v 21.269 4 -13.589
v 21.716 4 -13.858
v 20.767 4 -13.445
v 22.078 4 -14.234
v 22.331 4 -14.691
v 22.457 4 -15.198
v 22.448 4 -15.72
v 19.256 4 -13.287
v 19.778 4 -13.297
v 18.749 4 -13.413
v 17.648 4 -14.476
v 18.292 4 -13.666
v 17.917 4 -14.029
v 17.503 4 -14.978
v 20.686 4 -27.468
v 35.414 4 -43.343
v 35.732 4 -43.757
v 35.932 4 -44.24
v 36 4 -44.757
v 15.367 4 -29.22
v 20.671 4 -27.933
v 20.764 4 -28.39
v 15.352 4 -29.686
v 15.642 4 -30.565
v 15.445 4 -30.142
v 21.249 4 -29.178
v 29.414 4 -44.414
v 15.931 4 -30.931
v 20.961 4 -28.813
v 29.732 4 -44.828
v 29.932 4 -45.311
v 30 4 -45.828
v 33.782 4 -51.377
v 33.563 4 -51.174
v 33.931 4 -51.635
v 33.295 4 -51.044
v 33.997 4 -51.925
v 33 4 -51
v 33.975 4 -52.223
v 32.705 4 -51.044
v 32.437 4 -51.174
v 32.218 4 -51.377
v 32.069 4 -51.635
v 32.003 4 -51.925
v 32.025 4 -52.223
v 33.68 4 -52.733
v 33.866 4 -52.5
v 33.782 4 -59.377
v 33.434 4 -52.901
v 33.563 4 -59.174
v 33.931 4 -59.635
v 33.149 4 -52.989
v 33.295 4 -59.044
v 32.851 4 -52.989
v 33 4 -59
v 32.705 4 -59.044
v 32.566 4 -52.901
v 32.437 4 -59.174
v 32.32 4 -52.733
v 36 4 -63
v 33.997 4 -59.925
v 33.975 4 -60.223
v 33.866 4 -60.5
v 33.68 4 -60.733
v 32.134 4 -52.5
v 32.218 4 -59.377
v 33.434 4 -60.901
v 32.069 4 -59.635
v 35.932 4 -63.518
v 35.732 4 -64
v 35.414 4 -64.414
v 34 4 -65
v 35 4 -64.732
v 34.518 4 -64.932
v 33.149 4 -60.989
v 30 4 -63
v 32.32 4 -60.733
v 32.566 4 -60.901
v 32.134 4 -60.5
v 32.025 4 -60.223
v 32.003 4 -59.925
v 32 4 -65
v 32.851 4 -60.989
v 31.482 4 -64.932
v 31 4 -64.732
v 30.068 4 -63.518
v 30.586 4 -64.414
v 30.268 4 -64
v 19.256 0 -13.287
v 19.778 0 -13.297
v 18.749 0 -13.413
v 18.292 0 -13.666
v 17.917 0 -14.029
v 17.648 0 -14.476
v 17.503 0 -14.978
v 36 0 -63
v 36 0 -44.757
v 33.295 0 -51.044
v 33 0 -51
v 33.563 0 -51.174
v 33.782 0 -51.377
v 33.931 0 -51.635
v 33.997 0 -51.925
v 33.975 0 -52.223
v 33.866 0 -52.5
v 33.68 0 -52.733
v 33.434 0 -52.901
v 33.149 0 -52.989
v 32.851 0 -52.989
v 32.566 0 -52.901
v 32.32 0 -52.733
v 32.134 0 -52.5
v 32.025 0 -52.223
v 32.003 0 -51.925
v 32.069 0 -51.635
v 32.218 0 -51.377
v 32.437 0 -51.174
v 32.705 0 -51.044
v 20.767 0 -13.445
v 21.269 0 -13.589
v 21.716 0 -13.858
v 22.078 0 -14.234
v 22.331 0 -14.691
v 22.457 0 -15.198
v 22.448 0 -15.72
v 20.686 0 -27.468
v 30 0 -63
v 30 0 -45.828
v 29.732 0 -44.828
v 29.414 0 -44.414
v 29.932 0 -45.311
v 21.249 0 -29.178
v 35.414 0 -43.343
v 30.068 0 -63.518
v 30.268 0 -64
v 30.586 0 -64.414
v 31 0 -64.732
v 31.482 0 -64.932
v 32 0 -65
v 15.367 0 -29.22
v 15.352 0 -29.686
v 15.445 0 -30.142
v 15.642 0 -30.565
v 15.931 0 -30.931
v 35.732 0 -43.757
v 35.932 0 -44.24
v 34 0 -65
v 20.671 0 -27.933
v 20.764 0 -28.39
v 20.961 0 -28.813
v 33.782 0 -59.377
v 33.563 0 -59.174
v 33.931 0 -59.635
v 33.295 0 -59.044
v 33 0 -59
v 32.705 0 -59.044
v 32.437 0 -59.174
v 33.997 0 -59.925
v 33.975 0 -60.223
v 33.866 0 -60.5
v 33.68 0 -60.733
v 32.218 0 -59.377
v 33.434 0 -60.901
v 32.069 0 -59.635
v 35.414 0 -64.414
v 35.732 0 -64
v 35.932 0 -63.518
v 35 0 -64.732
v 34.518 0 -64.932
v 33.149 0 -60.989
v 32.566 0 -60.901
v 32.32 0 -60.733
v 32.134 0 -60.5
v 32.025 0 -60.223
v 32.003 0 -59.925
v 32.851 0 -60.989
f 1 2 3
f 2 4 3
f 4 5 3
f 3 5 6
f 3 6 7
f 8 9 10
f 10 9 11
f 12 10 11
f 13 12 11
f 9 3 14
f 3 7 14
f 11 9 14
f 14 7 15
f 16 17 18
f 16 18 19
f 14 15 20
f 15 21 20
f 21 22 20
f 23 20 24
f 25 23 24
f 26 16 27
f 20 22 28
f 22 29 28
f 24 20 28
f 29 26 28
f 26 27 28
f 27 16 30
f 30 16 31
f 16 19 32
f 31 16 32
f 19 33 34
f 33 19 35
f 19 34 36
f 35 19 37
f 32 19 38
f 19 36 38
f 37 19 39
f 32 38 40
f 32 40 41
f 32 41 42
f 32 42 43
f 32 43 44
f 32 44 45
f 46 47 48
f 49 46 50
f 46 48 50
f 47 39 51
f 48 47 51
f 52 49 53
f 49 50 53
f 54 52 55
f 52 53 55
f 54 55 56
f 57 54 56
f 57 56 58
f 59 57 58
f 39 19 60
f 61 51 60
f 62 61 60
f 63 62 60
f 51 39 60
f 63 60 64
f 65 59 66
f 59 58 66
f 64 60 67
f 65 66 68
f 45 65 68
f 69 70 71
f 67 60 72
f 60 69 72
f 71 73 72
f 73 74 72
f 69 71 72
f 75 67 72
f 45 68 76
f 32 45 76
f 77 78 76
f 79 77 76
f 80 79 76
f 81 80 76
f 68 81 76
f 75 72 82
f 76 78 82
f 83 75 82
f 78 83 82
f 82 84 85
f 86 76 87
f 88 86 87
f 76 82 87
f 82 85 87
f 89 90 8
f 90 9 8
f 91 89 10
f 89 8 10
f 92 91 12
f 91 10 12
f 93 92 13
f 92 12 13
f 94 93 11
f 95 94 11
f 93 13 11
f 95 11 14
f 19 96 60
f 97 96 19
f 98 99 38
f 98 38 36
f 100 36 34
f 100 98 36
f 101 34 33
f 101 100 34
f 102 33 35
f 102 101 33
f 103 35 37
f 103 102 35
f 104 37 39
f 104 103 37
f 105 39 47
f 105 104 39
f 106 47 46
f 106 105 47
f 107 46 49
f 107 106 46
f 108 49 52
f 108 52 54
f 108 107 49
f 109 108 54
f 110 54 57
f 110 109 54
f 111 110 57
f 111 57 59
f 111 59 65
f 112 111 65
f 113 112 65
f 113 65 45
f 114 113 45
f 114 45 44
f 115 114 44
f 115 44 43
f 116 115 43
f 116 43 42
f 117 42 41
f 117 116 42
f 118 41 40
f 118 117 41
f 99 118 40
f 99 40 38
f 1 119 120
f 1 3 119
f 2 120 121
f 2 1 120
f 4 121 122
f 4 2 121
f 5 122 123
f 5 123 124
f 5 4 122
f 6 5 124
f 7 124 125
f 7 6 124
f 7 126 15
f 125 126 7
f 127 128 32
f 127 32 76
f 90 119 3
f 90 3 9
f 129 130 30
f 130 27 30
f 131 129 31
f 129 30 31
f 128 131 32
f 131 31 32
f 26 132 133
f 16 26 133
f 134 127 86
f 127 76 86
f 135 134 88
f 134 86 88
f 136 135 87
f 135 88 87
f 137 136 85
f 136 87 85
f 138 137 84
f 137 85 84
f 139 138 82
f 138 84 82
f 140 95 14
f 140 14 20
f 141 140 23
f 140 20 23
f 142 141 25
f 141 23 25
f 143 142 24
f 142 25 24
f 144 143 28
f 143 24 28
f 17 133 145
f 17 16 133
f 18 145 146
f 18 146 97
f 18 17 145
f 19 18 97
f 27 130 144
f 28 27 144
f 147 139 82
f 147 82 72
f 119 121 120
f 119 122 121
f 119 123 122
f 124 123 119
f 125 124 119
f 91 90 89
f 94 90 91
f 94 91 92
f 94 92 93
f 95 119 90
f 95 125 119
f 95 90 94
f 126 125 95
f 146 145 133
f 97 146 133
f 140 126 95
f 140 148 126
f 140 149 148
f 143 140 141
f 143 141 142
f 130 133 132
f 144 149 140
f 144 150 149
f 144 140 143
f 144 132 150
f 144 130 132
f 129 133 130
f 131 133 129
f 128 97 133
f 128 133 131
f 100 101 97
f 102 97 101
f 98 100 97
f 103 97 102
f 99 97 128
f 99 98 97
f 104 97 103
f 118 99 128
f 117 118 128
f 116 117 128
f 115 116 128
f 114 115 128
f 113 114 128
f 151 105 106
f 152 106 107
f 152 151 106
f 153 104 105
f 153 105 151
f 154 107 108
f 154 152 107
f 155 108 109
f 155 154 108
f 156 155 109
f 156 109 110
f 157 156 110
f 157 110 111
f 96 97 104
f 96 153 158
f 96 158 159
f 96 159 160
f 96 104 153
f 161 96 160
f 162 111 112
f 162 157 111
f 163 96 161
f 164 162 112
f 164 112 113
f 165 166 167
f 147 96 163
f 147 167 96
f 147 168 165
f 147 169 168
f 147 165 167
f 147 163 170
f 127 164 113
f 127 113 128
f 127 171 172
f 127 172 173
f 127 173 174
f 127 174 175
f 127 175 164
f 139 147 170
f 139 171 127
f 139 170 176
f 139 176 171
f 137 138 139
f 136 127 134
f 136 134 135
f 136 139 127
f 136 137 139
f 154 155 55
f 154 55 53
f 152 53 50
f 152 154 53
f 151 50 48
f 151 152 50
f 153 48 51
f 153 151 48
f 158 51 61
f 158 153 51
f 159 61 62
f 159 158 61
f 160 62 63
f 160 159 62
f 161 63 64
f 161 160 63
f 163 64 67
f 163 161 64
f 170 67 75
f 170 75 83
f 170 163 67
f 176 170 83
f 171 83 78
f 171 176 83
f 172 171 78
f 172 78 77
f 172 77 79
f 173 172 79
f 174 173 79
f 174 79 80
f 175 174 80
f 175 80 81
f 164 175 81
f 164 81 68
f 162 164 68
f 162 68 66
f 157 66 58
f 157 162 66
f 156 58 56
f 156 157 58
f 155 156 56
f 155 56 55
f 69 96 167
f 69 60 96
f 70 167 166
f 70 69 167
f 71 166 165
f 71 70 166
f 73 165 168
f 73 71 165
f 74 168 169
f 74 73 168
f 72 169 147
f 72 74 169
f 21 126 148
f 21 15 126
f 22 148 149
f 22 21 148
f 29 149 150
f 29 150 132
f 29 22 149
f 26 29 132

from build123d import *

# Parameters (mm, degrees)
SKETCH_1_R      = 1
EXTRUDE_1_DEPTH = 4
FILLET_1_R      = 2


with BuildPart() as part:
    # 草图1 → 凸台-拉伸1 (new body)
    with BuildSketch(Plane(origin=(0, 0, 0), x_dir=(1, 0, 0), z_dir=(0, 1, 0))):
        Polygon((22.744681764, 13.741702265), (17.8, 13), (15.217391304, 30.217391304), (25, 40), (30, 45), (30, 65), (36, 65), (36, 43.928932188), (30.292893219, 38.221825407), (20.536171544, 28.465103732), align=None)
        with Locations(Location((33, 52, 0), (0, 0, 270))):
            Circle(SKETCH_1_R, mode=Mode.SUBTRACT)
        with Locations(Location((33, 60, 0), (0, 0, 270))):
            Circle(SKETCH_1_R, mode=Mode.SUBTRACT)
    extrude(amount=EXTRUDE_1_DEPTH)

    # 圆角1
    fillet_1_edges = [part.edges().sort_by_distance(p)[0] for p in [
        (17.8, 2, -13),
        (15.217391304, 2, -30.217391304),
        (30, 2, -45),
        (30, 2, -65),
        (36, 2, -65),
        (36, 2, -43.928932188),
        (20.536171544, 2, -28.465103732),
        (22.744681764, 2, -13.741702265),
    ]]
    fillet(fillet_1_edges, radius=FILLET_1_R)


solid = part.part
